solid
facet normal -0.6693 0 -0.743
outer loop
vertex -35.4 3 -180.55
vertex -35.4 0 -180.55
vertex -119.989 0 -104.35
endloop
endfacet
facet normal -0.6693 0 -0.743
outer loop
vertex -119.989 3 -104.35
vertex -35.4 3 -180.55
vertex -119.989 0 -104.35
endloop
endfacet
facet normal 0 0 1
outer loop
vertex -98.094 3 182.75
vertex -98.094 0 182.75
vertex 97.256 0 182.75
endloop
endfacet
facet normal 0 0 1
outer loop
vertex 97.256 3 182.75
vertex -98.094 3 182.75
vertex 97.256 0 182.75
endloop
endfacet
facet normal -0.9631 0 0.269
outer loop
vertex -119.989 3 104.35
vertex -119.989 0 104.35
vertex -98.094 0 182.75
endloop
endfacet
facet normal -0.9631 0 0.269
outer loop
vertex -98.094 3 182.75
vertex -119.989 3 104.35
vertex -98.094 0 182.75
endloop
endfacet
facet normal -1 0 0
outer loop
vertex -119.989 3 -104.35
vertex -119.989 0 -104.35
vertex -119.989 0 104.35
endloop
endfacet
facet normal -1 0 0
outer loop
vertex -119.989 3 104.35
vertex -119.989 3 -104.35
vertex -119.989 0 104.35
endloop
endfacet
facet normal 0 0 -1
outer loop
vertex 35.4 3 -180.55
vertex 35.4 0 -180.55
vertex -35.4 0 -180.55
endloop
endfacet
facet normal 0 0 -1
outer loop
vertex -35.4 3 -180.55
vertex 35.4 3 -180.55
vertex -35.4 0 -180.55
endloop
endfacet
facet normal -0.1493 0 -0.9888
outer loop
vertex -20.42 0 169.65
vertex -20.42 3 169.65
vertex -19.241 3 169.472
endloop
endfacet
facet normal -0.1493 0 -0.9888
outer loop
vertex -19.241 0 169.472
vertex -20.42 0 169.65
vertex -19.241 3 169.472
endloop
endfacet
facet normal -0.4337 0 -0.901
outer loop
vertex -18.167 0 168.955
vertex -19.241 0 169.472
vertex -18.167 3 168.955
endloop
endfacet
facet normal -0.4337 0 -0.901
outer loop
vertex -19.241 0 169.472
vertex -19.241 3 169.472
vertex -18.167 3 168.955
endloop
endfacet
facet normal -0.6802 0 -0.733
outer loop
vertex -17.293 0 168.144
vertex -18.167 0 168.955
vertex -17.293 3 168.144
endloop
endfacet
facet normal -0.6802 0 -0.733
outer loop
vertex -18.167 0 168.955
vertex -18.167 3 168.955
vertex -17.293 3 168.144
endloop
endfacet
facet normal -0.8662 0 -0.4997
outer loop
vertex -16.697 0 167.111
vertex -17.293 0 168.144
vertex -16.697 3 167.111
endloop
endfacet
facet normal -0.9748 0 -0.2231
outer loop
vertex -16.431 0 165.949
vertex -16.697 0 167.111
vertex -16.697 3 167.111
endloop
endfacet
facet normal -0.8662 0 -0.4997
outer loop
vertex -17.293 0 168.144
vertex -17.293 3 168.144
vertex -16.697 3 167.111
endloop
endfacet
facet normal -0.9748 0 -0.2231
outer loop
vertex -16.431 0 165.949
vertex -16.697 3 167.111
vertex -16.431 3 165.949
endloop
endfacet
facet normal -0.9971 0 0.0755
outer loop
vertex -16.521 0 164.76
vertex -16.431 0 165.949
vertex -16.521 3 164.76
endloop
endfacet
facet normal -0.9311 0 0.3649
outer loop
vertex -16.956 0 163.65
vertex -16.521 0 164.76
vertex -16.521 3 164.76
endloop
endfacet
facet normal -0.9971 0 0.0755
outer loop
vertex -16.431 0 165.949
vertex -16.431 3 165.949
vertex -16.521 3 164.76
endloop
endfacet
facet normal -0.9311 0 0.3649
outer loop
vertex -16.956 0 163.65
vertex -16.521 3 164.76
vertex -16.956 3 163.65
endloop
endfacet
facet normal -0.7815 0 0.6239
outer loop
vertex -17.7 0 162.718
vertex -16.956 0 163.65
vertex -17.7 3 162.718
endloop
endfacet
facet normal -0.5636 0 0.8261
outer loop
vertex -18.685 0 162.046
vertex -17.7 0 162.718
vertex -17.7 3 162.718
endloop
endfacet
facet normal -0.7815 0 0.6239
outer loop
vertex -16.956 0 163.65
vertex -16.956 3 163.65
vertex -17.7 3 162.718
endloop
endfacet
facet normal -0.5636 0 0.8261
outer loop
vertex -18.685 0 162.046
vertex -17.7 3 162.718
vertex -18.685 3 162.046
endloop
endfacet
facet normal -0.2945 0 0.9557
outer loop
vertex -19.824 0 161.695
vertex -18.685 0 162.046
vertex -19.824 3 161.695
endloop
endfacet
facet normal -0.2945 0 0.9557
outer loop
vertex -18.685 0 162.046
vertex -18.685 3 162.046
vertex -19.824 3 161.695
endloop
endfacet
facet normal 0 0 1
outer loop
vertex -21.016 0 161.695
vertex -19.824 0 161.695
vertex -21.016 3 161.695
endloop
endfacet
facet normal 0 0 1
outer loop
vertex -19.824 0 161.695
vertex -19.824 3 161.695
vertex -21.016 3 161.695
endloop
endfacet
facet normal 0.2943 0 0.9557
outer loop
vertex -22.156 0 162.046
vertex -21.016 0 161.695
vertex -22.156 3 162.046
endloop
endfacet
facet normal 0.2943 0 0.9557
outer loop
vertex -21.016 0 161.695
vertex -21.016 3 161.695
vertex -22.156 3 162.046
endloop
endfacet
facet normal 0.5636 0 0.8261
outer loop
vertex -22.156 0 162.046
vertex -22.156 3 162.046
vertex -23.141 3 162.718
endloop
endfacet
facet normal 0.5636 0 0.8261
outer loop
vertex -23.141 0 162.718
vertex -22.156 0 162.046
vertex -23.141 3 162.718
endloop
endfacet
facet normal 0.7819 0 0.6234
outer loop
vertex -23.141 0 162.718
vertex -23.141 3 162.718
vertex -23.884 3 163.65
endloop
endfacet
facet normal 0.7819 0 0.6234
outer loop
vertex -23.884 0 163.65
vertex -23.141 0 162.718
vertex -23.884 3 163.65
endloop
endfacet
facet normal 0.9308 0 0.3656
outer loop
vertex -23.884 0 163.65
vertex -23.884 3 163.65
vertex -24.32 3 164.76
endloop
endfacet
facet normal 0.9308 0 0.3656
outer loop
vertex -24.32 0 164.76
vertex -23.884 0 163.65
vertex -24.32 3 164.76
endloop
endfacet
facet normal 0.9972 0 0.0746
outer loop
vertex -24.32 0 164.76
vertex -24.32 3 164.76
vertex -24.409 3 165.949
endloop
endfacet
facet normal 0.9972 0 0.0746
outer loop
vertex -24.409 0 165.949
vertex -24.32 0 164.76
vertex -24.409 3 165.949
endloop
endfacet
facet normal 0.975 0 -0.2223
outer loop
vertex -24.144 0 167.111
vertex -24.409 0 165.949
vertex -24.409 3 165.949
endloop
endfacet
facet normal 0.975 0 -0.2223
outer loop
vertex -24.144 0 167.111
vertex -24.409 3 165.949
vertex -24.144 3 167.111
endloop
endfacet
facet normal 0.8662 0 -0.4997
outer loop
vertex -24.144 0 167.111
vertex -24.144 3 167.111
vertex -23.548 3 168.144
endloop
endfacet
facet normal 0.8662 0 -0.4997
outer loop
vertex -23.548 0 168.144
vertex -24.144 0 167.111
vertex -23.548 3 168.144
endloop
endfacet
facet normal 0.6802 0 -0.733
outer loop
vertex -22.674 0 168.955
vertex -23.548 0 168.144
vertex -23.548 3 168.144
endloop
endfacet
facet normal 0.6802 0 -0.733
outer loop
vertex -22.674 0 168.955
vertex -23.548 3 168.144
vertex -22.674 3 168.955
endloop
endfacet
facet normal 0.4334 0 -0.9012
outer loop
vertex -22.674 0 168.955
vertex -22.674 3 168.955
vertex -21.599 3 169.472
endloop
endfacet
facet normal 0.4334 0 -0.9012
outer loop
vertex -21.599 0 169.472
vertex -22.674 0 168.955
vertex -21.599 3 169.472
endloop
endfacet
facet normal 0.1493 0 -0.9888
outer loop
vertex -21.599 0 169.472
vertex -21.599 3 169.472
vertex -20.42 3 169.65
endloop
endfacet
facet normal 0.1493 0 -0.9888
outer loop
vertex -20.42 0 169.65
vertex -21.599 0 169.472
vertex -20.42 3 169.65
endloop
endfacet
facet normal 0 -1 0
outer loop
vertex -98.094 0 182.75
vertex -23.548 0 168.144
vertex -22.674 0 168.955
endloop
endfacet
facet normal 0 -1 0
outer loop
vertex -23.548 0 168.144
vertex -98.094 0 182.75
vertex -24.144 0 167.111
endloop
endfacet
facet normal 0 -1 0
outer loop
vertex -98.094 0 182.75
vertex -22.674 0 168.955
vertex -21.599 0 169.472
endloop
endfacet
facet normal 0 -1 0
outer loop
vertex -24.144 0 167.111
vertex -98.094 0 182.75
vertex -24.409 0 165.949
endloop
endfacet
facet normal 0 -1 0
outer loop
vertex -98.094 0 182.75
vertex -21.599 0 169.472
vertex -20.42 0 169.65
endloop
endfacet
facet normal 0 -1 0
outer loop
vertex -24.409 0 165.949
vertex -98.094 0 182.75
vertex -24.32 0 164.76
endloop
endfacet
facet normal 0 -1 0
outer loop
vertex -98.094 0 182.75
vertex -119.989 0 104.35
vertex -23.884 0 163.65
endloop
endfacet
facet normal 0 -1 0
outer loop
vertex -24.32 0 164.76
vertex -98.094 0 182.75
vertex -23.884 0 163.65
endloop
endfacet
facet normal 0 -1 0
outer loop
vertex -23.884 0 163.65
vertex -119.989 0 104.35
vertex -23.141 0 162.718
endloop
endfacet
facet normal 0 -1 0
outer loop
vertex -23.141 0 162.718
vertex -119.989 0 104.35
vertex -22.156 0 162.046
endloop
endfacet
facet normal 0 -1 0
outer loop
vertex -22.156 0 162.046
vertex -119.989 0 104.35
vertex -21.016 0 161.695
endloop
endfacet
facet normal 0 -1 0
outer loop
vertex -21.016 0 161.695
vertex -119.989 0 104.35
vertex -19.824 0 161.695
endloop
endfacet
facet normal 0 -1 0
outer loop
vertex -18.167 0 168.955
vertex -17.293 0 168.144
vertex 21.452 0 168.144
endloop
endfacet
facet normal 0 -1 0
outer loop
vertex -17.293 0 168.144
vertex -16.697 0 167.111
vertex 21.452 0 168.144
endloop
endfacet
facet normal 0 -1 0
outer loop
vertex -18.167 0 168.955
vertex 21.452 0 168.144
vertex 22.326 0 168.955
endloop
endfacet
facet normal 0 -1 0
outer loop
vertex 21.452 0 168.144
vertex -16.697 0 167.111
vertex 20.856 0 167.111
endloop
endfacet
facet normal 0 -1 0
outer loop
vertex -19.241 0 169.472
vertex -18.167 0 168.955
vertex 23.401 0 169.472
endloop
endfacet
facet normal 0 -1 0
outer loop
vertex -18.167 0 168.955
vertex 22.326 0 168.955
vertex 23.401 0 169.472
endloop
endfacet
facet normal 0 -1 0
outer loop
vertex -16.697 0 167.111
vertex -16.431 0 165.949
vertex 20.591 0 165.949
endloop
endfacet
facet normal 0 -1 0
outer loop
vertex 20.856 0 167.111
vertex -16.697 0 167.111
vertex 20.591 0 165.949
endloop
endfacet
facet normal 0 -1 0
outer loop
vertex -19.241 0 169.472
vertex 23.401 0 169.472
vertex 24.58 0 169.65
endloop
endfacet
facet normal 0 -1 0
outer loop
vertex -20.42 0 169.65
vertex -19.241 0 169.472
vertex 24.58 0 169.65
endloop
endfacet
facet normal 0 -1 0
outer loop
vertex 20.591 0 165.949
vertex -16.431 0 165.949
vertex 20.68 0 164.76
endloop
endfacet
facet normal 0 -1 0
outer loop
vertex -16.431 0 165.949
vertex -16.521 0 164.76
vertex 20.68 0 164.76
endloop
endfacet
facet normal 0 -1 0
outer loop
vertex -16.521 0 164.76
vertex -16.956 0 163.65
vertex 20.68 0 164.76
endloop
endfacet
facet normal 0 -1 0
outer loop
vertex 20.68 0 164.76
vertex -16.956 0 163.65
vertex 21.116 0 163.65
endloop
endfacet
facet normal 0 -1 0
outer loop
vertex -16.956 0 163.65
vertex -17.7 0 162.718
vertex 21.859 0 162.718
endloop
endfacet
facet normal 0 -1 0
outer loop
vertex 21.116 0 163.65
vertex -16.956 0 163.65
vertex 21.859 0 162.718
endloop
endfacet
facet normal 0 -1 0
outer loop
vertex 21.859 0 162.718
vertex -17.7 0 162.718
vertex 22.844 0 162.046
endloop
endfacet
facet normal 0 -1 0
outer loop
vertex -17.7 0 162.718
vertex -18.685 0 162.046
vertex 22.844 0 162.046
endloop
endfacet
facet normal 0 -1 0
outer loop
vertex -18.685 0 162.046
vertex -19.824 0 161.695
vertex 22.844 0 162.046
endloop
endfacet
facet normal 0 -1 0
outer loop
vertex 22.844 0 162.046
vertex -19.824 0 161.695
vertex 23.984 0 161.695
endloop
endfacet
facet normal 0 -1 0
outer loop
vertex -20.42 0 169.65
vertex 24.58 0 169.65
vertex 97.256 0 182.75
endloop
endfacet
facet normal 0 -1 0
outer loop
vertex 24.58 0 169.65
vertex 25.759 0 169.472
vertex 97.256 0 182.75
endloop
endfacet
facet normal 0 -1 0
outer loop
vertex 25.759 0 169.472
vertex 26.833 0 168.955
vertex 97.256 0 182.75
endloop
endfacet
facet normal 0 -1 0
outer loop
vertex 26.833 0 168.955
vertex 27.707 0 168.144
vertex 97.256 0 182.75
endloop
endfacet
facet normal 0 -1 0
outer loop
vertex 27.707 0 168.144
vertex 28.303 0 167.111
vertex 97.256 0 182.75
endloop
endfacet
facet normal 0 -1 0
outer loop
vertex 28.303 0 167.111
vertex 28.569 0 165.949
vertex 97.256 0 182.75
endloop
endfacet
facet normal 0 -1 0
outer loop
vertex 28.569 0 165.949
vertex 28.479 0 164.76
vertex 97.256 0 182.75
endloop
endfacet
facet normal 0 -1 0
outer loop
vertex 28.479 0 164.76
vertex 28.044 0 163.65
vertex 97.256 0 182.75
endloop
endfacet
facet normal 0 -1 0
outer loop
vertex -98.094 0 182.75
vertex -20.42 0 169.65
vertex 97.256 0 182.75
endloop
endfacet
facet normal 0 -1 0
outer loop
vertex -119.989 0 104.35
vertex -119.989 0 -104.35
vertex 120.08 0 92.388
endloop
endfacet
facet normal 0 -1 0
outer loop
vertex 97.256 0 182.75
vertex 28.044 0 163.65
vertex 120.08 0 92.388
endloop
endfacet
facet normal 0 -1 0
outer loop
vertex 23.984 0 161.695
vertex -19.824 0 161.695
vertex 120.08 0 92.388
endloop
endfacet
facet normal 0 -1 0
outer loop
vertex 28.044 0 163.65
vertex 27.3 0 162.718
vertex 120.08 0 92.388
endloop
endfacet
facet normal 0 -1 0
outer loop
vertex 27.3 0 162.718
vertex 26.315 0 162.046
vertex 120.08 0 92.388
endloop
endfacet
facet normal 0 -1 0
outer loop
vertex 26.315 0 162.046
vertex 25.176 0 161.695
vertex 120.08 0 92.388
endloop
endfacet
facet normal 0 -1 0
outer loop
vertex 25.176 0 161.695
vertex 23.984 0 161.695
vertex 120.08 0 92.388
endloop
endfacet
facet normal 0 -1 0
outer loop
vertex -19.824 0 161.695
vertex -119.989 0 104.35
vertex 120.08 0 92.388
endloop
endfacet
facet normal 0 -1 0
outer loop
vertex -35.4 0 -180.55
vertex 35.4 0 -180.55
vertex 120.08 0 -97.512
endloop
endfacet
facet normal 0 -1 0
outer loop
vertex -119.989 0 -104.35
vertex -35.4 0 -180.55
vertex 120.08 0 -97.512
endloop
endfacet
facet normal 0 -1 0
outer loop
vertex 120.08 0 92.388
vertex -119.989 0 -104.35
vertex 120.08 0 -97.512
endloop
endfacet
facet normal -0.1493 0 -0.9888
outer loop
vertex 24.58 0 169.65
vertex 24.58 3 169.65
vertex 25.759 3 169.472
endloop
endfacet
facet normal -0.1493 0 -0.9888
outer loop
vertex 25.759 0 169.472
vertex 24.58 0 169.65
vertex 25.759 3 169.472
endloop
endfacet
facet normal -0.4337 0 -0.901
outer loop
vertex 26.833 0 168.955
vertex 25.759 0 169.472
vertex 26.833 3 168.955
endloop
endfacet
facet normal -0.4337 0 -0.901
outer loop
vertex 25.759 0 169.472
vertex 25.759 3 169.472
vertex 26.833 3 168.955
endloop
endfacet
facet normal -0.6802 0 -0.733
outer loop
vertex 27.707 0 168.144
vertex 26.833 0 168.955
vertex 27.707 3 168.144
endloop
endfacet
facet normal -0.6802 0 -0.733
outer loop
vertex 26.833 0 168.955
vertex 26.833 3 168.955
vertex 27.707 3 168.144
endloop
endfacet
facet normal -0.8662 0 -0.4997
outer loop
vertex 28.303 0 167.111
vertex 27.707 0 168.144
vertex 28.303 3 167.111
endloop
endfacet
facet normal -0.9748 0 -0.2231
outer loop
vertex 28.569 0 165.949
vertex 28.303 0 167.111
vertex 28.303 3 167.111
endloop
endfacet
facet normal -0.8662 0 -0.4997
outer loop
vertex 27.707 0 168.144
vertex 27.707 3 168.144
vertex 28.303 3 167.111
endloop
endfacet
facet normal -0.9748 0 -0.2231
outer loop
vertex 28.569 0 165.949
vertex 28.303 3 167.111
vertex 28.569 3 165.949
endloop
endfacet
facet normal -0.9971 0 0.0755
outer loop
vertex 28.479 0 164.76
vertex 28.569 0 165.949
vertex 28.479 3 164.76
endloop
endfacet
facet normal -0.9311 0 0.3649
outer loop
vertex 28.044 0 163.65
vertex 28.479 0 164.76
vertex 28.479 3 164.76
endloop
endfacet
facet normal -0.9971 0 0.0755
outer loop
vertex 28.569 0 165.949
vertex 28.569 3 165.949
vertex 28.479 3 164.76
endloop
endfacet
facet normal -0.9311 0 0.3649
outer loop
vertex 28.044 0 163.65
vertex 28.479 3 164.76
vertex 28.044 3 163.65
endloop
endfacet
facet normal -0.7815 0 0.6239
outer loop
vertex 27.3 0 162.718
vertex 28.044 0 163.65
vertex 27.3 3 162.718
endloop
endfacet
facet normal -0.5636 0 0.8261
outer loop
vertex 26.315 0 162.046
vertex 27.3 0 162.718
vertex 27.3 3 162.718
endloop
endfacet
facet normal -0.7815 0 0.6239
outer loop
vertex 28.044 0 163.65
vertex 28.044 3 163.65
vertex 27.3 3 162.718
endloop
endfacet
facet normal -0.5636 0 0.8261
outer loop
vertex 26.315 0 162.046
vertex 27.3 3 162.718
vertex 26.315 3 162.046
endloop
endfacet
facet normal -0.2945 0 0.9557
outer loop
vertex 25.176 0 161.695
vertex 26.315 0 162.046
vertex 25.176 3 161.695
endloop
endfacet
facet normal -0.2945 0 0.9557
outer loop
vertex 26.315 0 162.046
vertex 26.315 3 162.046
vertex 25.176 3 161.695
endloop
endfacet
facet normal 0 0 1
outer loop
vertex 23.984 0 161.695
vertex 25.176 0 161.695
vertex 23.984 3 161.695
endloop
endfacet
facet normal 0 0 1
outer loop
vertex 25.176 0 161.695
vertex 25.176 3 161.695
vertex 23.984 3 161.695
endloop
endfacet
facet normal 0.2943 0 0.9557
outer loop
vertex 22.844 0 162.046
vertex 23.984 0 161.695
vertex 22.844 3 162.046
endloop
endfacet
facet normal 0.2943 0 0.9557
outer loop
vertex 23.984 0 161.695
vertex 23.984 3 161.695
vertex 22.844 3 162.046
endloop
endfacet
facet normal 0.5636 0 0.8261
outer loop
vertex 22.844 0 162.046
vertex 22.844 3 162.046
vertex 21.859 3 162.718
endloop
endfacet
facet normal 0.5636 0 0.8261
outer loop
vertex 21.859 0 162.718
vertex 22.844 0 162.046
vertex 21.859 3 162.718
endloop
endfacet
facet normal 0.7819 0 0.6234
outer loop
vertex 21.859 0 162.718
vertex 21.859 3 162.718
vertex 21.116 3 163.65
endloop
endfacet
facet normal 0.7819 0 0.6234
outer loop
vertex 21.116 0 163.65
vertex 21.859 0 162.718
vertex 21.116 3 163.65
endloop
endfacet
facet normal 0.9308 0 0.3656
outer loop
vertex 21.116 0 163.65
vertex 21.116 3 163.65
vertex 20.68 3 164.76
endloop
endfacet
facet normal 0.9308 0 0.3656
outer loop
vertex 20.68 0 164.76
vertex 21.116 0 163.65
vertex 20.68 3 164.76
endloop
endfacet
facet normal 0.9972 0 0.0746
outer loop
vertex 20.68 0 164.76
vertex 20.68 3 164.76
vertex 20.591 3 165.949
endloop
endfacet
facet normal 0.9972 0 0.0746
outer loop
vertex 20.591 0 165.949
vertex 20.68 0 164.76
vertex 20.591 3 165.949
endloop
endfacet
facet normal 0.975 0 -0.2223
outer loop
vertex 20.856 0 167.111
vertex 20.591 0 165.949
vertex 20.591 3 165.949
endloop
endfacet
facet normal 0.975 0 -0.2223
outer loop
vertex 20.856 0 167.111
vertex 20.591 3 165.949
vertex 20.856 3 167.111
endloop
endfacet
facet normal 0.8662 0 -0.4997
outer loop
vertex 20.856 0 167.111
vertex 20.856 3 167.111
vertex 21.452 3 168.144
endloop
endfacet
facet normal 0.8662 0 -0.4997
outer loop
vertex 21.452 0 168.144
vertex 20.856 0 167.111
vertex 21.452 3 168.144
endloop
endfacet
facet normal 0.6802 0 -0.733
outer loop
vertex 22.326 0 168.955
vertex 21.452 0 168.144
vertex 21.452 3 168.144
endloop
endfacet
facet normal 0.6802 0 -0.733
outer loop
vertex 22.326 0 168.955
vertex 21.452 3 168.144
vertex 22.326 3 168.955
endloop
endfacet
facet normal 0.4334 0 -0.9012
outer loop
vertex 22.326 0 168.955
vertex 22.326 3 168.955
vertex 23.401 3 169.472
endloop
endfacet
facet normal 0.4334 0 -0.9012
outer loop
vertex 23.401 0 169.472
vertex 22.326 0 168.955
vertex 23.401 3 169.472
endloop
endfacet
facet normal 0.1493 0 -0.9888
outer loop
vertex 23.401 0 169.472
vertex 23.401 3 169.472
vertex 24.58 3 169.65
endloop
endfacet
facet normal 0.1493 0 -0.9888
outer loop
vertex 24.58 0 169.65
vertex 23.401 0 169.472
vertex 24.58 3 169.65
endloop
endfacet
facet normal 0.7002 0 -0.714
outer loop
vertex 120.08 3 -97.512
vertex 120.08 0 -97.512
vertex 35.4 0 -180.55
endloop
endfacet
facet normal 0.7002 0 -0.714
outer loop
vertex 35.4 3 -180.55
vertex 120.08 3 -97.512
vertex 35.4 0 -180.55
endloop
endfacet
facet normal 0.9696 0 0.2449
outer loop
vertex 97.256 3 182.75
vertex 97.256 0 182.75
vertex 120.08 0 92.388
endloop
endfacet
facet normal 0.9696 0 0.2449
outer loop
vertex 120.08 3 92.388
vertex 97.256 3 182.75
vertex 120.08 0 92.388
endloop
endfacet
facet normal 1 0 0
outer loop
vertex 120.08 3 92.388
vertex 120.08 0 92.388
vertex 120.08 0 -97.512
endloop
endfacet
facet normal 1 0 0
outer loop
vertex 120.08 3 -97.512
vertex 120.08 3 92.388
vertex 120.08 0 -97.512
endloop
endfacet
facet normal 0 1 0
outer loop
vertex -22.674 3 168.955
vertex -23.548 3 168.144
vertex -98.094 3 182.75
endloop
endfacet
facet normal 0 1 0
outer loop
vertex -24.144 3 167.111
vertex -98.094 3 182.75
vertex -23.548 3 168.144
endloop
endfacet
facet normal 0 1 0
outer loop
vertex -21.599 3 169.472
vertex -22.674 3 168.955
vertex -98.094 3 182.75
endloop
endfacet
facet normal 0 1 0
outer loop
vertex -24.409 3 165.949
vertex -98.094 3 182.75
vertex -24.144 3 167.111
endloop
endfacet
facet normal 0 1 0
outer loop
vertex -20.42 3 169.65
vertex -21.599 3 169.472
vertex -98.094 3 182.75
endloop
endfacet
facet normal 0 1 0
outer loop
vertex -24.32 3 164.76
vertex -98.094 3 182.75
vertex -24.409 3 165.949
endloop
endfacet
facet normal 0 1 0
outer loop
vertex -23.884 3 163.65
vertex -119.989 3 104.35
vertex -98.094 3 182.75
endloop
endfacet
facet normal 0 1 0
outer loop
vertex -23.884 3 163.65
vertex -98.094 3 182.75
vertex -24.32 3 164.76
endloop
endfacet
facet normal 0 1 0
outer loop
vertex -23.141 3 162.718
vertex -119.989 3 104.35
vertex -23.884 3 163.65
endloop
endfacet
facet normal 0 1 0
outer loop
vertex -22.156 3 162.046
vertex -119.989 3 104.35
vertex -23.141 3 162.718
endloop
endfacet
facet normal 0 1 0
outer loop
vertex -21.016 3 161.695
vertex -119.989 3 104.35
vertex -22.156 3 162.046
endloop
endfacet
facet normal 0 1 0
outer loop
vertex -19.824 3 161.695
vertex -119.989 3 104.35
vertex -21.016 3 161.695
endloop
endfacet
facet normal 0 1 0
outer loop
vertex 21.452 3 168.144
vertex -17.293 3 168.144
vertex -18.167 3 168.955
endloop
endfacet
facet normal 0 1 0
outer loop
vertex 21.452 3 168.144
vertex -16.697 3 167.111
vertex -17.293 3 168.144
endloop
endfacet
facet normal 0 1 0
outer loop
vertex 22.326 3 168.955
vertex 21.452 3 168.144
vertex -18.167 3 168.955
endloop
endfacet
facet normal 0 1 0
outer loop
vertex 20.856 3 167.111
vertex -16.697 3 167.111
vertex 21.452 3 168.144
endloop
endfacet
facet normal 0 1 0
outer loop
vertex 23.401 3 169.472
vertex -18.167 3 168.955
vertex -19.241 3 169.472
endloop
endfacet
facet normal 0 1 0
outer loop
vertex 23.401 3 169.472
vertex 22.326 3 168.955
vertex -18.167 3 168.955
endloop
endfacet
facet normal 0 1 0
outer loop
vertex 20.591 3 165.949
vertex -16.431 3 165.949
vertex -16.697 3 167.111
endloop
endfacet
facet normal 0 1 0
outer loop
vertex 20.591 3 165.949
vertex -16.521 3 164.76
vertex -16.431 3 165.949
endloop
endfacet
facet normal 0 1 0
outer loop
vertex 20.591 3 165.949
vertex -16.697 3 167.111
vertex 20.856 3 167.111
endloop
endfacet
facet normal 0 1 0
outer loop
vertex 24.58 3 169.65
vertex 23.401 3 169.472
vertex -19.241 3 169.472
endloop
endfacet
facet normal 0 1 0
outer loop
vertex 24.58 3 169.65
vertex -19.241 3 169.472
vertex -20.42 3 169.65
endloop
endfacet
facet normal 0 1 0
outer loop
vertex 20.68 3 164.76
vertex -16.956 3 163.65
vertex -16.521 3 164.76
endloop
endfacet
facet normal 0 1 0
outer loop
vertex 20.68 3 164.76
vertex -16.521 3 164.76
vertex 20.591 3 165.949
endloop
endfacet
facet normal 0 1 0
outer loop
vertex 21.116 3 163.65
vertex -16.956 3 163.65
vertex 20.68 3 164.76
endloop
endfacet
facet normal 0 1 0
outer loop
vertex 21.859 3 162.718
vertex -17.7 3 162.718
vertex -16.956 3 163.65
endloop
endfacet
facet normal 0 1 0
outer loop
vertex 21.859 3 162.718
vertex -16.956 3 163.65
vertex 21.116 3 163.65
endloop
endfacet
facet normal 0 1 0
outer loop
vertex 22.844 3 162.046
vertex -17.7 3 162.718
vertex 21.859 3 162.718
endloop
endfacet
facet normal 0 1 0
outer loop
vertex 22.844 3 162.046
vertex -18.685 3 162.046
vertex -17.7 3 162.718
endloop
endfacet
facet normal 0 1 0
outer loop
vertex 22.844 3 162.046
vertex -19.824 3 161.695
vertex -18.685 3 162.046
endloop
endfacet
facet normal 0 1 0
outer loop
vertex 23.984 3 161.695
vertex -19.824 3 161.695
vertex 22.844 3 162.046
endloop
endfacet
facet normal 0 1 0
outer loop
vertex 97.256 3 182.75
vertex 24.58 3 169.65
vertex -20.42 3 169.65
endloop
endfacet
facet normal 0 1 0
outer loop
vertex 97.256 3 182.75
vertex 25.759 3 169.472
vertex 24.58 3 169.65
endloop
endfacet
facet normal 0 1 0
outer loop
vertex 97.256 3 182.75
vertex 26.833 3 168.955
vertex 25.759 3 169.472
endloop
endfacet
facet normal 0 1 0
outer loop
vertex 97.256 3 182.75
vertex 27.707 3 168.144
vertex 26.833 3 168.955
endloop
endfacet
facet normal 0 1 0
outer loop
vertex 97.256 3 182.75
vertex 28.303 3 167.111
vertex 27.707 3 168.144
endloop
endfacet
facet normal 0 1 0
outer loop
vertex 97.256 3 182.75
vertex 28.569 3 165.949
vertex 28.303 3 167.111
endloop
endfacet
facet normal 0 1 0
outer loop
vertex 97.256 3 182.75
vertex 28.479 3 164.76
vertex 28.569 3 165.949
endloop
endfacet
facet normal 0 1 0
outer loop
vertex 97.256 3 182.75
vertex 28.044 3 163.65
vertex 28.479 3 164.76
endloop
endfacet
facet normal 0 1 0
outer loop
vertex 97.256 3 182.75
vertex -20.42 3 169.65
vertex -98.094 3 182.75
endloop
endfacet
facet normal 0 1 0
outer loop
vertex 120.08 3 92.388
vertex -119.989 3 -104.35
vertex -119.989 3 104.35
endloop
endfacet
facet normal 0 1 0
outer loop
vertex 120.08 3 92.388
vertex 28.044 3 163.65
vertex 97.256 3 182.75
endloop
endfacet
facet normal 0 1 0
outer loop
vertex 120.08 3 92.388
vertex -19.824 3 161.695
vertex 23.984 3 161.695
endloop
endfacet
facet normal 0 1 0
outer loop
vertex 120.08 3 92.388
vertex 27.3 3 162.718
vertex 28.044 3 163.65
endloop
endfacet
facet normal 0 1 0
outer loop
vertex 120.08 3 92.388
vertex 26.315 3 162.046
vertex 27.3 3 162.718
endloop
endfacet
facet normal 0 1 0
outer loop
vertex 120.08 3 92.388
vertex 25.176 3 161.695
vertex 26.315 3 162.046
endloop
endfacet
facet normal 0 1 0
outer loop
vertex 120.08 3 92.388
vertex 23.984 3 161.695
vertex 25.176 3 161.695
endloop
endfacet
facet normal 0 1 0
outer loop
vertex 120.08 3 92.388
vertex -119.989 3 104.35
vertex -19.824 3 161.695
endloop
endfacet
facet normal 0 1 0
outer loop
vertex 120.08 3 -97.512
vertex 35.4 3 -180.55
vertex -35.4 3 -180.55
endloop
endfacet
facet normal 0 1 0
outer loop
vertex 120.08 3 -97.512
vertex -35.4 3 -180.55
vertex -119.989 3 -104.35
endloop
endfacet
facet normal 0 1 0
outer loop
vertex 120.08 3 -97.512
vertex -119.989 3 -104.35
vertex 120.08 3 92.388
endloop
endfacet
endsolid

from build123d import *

# Parameters (mm, degrees)
RESSALTO_EXTRUS_O1_DEPTH = 3
ESBO_O2_R                = 4
CORTE_EXTRUS_O1_DEPTH    = 219.690902409


with BuildPart() as part:
    # Esboço1 → Ressalto-extrusão1 (new body)
    with BuildSketch(Plane(origin=(0, 0, 0), x_dir=(1, 0, 0), z_dir=(0, 1, 0))):
        Polygon((97.255710926, -182.75), (120.079758063, -92.387934551), (120.079758063, 97.512065449), (35.4, 180.55), (-35.4, 180.55), (-119.989494029, 104.35), (-119.989494029, -104.35), (-98.094289074, -182.75), align=None)
    extrude(amount=RESSALTO_EXTRUS_O1_DEPTH)

    # Esboço2 → Corte-extrusão1 (cut, through all)
    with BuildSketch(Plane(origin=(0, 3, 0), x_dir=(1, 0, 0), z_dir=(0, 1, 0))):
        with Locations(Location((24.579758063, -165.65, 0), (0, 0, 270))):
            Circle(ESBO_O2_R)
        with Locations(Location((-20.420241937, -165.65, 0), (0, 0, 270))):
            Circle(ESBO_O2_R)
    extrude(amount=-CORTE_EXTRUS_O1_DEPTH, mode=Mode.SUBTRACT)


solid = part.part
